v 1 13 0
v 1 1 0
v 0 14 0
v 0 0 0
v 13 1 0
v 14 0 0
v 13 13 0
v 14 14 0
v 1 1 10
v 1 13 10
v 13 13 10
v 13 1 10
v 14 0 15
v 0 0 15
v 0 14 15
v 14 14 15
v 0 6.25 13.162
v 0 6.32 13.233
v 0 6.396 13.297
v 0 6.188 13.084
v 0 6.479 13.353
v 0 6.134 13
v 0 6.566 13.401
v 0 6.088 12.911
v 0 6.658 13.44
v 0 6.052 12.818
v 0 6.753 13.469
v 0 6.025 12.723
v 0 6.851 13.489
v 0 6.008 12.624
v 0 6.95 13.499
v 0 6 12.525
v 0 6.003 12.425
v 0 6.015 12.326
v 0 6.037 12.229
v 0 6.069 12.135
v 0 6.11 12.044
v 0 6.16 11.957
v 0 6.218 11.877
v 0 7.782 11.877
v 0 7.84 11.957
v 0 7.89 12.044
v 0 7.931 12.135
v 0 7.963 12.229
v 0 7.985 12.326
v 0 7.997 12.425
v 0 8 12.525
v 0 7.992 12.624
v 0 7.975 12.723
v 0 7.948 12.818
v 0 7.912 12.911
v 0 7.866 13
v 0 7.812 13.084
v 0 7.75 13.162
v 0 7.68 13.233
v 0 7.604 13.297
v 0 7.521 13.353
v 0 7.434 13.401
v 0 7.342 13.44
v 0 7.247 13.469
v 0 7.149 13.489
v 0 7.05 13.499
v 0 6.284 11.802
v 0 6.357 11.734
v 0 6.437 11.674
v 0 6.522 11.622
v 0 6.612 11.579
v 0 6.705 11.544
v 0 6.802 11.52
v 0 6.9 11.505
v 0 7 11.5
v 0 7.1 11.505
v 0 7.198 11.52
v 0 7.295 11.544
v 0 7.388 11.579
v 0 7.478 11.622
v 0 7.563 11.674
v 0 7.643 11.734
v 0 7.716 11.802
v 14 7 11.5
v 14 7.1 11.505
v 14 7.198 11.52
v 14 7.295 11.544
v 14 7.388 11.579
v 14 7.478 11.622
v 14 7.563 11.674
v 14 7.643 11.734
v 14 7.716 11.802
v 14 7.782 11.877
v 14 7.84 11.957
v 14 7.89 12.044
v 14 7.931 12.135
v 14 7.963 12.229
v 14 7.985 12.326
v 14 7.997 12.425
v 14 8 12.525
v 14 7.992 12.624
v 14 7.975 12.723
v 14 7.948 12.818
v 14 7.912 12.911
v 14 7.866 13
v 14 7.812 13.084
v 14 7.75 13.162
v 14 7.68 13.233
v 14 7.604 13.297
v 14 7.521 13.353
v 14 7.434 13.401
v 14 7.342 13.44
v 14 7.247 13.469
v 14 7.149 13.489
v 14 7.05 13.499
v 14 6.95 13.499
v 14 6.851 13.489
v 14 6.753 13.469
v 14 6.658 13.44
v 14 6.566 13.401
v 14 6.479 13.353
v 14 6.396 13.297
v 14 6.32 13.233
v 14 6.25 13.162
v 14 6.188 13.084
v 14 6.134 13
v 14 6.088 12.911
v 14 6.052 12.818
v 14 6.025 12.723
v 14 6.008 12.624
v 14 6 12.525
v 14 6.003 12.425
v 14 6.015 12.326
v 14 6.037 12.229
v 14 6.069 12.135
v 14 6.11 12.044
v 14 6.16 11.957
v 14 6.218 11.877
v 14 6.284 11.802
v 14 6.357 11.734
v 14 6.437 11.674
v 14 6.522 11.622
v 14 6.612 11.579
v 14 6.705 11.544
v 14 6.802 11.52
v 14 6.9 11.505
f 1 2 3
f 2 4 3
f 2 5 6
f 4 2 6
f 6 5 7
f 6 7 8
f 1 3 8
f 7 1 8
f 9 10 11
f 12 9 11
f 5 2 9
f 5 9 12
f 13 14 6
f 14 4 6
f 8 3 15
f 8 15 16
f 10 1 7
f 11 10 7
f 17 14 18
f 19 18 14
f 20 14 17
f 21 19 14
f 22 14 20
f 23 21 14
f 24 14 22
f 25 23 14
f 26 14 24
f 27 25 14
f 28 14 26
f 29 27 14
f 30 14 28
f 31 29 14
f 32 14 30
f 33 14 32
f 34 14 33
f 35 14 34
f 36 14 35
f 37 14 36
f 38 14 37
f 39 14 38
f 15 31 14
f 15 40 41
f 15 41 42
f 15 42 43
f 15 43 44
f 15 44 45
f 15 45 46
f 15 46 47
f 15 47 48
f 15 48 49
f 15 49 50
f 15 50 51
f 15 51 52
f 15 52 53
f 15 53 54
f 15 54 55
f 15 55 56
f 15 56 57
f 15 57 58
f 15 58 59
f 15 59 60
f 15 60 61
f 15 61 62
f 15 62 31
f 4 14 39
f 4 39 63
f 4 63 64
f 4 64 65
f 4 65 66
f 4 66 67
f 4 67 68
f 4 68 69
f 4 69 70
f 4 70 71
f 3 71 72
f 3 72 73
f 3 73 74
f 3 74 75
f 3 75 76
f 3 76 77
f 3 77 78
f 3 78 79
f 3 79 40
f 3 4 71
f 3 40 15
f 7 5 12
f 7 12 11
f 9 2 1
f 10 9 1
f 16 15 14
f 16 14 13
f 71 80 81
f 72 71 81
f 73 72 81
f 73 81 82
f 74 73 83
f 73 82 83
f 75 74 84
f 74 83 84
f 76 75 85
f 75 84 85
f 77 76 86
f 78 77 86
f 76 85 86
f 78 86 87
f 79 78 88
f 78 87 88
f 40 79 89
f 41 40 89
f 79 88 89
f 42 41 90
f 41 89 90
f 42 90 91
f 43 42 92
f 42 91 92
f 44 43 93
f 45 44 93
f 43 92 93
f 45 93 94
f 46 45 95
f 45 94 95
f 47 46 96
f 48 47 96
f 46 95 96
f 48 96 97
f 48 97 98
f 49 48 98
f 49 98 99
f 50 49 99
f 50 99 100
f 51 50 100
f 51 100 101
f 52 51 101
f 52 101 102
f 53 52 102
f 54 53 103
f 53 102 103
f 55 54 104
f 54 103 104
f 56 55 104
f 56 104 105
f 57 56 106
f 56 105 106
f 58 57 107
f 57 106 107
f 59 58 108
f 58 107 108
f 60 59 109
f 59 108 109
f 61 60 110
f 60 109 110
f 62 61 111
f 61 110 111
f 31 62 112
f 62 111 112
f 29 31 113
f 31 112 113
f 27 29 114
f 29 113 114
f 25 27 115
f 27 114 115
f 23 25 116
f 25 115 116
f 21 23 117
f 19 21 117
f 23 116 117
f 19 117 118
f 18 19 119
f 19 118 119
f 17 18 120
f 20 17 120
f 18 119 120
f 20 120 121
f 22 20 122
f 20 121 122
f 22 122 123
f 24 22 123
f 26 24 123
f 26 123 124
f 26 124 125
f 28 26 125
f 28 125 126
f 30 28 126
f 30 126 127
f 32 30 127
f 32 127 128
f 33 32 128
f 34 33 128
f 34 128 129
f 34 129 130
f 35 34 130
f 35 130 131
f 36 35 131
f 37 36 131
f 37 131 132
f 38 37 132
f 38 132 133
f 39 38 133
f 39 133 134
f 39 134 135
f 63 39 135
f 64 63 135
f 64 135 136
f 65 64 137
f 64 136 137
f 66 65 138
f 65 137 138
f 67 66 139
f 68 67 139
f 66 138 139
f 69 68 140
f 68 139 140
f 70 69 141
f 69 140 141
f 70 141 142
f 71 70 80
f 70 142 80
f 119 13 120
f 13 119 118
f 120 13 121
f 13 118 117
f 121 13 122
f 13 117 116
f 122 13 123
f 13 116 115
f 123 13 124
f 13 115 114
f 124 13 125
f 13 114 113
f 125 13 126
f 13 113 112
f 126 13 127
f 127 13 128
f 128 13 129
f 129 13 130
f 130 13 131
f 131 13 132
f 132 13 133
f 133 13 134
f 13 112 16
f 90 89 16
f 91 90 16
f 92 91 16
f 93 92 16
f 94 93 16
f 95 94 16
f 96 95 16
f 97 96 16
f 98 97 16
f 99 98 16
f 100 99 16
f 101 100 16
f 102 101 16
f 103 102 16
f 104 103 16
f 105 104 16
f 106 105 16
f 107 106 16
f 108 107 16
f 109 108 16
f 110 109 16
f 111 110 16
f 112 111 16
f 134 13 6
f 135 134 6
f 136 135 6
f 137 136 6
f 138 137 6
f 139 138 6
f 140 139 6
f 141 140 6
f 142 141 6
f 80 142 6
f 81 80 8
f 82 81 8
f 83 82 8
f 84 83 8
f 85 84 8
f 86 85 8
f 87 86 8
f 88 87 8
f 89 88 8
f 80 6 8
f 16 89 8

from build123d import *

# Parameters (mm, degrees)
SKETCH_1_W          = 14
SKETCH_1_H          = 14
SKETCH_1_W_2        = 12
SKETCH_1_H_2        = 12
EXTRUDE_1_DEPTH     = 10
SKETCH_2_W          = 14
SKETCH_2_H          = 14
EXTRUDE_2_DEPTH     = 5
SKETCH_3_R          = 1
CUT_EXTRUDE_1_DEPTH = 14


with BuildPart() as part:
    # 草图1 → 凸台-拉伸1 (new body)
    with BuildSketch(Plane.XY):
        with Locations((7, 7)):
            Rectangle(SKETCH_1_W, SKETCH_1_H)
        with Locations((7, 7)):
            Rectangle(SKETCH_1_W_2, SKETCH_1_H_2, mode=Mode.SUBTRACT)
    extrude(amount=EXTRUDE_1_DEPTH)

    # 草图2 → 凸台-拉伸2 (add)
    with BuildSketch(Plane.XY.offset(10)):
        with Locations((7, 7)):
            Rectangle(SKETCH_2_W, SKETCH_2_H)
    extrude(amount=EXTRUDE_2_DEPTH)

    # 草图3 → 切除-拉伸1 (cut)
    with BuildSketch(Plane(origin=(14, 0, 0), x_dir=(0, 0, -1), z_dir=(1, 0, 0))):
        with Locations((-12.5, 7)):
            Circle(SKETCH_3_R)
    extrude(amount=-CUT_EXTRUDE_1_DEPTH, mode=Mode.SUBTRACT)


solid = part.part
